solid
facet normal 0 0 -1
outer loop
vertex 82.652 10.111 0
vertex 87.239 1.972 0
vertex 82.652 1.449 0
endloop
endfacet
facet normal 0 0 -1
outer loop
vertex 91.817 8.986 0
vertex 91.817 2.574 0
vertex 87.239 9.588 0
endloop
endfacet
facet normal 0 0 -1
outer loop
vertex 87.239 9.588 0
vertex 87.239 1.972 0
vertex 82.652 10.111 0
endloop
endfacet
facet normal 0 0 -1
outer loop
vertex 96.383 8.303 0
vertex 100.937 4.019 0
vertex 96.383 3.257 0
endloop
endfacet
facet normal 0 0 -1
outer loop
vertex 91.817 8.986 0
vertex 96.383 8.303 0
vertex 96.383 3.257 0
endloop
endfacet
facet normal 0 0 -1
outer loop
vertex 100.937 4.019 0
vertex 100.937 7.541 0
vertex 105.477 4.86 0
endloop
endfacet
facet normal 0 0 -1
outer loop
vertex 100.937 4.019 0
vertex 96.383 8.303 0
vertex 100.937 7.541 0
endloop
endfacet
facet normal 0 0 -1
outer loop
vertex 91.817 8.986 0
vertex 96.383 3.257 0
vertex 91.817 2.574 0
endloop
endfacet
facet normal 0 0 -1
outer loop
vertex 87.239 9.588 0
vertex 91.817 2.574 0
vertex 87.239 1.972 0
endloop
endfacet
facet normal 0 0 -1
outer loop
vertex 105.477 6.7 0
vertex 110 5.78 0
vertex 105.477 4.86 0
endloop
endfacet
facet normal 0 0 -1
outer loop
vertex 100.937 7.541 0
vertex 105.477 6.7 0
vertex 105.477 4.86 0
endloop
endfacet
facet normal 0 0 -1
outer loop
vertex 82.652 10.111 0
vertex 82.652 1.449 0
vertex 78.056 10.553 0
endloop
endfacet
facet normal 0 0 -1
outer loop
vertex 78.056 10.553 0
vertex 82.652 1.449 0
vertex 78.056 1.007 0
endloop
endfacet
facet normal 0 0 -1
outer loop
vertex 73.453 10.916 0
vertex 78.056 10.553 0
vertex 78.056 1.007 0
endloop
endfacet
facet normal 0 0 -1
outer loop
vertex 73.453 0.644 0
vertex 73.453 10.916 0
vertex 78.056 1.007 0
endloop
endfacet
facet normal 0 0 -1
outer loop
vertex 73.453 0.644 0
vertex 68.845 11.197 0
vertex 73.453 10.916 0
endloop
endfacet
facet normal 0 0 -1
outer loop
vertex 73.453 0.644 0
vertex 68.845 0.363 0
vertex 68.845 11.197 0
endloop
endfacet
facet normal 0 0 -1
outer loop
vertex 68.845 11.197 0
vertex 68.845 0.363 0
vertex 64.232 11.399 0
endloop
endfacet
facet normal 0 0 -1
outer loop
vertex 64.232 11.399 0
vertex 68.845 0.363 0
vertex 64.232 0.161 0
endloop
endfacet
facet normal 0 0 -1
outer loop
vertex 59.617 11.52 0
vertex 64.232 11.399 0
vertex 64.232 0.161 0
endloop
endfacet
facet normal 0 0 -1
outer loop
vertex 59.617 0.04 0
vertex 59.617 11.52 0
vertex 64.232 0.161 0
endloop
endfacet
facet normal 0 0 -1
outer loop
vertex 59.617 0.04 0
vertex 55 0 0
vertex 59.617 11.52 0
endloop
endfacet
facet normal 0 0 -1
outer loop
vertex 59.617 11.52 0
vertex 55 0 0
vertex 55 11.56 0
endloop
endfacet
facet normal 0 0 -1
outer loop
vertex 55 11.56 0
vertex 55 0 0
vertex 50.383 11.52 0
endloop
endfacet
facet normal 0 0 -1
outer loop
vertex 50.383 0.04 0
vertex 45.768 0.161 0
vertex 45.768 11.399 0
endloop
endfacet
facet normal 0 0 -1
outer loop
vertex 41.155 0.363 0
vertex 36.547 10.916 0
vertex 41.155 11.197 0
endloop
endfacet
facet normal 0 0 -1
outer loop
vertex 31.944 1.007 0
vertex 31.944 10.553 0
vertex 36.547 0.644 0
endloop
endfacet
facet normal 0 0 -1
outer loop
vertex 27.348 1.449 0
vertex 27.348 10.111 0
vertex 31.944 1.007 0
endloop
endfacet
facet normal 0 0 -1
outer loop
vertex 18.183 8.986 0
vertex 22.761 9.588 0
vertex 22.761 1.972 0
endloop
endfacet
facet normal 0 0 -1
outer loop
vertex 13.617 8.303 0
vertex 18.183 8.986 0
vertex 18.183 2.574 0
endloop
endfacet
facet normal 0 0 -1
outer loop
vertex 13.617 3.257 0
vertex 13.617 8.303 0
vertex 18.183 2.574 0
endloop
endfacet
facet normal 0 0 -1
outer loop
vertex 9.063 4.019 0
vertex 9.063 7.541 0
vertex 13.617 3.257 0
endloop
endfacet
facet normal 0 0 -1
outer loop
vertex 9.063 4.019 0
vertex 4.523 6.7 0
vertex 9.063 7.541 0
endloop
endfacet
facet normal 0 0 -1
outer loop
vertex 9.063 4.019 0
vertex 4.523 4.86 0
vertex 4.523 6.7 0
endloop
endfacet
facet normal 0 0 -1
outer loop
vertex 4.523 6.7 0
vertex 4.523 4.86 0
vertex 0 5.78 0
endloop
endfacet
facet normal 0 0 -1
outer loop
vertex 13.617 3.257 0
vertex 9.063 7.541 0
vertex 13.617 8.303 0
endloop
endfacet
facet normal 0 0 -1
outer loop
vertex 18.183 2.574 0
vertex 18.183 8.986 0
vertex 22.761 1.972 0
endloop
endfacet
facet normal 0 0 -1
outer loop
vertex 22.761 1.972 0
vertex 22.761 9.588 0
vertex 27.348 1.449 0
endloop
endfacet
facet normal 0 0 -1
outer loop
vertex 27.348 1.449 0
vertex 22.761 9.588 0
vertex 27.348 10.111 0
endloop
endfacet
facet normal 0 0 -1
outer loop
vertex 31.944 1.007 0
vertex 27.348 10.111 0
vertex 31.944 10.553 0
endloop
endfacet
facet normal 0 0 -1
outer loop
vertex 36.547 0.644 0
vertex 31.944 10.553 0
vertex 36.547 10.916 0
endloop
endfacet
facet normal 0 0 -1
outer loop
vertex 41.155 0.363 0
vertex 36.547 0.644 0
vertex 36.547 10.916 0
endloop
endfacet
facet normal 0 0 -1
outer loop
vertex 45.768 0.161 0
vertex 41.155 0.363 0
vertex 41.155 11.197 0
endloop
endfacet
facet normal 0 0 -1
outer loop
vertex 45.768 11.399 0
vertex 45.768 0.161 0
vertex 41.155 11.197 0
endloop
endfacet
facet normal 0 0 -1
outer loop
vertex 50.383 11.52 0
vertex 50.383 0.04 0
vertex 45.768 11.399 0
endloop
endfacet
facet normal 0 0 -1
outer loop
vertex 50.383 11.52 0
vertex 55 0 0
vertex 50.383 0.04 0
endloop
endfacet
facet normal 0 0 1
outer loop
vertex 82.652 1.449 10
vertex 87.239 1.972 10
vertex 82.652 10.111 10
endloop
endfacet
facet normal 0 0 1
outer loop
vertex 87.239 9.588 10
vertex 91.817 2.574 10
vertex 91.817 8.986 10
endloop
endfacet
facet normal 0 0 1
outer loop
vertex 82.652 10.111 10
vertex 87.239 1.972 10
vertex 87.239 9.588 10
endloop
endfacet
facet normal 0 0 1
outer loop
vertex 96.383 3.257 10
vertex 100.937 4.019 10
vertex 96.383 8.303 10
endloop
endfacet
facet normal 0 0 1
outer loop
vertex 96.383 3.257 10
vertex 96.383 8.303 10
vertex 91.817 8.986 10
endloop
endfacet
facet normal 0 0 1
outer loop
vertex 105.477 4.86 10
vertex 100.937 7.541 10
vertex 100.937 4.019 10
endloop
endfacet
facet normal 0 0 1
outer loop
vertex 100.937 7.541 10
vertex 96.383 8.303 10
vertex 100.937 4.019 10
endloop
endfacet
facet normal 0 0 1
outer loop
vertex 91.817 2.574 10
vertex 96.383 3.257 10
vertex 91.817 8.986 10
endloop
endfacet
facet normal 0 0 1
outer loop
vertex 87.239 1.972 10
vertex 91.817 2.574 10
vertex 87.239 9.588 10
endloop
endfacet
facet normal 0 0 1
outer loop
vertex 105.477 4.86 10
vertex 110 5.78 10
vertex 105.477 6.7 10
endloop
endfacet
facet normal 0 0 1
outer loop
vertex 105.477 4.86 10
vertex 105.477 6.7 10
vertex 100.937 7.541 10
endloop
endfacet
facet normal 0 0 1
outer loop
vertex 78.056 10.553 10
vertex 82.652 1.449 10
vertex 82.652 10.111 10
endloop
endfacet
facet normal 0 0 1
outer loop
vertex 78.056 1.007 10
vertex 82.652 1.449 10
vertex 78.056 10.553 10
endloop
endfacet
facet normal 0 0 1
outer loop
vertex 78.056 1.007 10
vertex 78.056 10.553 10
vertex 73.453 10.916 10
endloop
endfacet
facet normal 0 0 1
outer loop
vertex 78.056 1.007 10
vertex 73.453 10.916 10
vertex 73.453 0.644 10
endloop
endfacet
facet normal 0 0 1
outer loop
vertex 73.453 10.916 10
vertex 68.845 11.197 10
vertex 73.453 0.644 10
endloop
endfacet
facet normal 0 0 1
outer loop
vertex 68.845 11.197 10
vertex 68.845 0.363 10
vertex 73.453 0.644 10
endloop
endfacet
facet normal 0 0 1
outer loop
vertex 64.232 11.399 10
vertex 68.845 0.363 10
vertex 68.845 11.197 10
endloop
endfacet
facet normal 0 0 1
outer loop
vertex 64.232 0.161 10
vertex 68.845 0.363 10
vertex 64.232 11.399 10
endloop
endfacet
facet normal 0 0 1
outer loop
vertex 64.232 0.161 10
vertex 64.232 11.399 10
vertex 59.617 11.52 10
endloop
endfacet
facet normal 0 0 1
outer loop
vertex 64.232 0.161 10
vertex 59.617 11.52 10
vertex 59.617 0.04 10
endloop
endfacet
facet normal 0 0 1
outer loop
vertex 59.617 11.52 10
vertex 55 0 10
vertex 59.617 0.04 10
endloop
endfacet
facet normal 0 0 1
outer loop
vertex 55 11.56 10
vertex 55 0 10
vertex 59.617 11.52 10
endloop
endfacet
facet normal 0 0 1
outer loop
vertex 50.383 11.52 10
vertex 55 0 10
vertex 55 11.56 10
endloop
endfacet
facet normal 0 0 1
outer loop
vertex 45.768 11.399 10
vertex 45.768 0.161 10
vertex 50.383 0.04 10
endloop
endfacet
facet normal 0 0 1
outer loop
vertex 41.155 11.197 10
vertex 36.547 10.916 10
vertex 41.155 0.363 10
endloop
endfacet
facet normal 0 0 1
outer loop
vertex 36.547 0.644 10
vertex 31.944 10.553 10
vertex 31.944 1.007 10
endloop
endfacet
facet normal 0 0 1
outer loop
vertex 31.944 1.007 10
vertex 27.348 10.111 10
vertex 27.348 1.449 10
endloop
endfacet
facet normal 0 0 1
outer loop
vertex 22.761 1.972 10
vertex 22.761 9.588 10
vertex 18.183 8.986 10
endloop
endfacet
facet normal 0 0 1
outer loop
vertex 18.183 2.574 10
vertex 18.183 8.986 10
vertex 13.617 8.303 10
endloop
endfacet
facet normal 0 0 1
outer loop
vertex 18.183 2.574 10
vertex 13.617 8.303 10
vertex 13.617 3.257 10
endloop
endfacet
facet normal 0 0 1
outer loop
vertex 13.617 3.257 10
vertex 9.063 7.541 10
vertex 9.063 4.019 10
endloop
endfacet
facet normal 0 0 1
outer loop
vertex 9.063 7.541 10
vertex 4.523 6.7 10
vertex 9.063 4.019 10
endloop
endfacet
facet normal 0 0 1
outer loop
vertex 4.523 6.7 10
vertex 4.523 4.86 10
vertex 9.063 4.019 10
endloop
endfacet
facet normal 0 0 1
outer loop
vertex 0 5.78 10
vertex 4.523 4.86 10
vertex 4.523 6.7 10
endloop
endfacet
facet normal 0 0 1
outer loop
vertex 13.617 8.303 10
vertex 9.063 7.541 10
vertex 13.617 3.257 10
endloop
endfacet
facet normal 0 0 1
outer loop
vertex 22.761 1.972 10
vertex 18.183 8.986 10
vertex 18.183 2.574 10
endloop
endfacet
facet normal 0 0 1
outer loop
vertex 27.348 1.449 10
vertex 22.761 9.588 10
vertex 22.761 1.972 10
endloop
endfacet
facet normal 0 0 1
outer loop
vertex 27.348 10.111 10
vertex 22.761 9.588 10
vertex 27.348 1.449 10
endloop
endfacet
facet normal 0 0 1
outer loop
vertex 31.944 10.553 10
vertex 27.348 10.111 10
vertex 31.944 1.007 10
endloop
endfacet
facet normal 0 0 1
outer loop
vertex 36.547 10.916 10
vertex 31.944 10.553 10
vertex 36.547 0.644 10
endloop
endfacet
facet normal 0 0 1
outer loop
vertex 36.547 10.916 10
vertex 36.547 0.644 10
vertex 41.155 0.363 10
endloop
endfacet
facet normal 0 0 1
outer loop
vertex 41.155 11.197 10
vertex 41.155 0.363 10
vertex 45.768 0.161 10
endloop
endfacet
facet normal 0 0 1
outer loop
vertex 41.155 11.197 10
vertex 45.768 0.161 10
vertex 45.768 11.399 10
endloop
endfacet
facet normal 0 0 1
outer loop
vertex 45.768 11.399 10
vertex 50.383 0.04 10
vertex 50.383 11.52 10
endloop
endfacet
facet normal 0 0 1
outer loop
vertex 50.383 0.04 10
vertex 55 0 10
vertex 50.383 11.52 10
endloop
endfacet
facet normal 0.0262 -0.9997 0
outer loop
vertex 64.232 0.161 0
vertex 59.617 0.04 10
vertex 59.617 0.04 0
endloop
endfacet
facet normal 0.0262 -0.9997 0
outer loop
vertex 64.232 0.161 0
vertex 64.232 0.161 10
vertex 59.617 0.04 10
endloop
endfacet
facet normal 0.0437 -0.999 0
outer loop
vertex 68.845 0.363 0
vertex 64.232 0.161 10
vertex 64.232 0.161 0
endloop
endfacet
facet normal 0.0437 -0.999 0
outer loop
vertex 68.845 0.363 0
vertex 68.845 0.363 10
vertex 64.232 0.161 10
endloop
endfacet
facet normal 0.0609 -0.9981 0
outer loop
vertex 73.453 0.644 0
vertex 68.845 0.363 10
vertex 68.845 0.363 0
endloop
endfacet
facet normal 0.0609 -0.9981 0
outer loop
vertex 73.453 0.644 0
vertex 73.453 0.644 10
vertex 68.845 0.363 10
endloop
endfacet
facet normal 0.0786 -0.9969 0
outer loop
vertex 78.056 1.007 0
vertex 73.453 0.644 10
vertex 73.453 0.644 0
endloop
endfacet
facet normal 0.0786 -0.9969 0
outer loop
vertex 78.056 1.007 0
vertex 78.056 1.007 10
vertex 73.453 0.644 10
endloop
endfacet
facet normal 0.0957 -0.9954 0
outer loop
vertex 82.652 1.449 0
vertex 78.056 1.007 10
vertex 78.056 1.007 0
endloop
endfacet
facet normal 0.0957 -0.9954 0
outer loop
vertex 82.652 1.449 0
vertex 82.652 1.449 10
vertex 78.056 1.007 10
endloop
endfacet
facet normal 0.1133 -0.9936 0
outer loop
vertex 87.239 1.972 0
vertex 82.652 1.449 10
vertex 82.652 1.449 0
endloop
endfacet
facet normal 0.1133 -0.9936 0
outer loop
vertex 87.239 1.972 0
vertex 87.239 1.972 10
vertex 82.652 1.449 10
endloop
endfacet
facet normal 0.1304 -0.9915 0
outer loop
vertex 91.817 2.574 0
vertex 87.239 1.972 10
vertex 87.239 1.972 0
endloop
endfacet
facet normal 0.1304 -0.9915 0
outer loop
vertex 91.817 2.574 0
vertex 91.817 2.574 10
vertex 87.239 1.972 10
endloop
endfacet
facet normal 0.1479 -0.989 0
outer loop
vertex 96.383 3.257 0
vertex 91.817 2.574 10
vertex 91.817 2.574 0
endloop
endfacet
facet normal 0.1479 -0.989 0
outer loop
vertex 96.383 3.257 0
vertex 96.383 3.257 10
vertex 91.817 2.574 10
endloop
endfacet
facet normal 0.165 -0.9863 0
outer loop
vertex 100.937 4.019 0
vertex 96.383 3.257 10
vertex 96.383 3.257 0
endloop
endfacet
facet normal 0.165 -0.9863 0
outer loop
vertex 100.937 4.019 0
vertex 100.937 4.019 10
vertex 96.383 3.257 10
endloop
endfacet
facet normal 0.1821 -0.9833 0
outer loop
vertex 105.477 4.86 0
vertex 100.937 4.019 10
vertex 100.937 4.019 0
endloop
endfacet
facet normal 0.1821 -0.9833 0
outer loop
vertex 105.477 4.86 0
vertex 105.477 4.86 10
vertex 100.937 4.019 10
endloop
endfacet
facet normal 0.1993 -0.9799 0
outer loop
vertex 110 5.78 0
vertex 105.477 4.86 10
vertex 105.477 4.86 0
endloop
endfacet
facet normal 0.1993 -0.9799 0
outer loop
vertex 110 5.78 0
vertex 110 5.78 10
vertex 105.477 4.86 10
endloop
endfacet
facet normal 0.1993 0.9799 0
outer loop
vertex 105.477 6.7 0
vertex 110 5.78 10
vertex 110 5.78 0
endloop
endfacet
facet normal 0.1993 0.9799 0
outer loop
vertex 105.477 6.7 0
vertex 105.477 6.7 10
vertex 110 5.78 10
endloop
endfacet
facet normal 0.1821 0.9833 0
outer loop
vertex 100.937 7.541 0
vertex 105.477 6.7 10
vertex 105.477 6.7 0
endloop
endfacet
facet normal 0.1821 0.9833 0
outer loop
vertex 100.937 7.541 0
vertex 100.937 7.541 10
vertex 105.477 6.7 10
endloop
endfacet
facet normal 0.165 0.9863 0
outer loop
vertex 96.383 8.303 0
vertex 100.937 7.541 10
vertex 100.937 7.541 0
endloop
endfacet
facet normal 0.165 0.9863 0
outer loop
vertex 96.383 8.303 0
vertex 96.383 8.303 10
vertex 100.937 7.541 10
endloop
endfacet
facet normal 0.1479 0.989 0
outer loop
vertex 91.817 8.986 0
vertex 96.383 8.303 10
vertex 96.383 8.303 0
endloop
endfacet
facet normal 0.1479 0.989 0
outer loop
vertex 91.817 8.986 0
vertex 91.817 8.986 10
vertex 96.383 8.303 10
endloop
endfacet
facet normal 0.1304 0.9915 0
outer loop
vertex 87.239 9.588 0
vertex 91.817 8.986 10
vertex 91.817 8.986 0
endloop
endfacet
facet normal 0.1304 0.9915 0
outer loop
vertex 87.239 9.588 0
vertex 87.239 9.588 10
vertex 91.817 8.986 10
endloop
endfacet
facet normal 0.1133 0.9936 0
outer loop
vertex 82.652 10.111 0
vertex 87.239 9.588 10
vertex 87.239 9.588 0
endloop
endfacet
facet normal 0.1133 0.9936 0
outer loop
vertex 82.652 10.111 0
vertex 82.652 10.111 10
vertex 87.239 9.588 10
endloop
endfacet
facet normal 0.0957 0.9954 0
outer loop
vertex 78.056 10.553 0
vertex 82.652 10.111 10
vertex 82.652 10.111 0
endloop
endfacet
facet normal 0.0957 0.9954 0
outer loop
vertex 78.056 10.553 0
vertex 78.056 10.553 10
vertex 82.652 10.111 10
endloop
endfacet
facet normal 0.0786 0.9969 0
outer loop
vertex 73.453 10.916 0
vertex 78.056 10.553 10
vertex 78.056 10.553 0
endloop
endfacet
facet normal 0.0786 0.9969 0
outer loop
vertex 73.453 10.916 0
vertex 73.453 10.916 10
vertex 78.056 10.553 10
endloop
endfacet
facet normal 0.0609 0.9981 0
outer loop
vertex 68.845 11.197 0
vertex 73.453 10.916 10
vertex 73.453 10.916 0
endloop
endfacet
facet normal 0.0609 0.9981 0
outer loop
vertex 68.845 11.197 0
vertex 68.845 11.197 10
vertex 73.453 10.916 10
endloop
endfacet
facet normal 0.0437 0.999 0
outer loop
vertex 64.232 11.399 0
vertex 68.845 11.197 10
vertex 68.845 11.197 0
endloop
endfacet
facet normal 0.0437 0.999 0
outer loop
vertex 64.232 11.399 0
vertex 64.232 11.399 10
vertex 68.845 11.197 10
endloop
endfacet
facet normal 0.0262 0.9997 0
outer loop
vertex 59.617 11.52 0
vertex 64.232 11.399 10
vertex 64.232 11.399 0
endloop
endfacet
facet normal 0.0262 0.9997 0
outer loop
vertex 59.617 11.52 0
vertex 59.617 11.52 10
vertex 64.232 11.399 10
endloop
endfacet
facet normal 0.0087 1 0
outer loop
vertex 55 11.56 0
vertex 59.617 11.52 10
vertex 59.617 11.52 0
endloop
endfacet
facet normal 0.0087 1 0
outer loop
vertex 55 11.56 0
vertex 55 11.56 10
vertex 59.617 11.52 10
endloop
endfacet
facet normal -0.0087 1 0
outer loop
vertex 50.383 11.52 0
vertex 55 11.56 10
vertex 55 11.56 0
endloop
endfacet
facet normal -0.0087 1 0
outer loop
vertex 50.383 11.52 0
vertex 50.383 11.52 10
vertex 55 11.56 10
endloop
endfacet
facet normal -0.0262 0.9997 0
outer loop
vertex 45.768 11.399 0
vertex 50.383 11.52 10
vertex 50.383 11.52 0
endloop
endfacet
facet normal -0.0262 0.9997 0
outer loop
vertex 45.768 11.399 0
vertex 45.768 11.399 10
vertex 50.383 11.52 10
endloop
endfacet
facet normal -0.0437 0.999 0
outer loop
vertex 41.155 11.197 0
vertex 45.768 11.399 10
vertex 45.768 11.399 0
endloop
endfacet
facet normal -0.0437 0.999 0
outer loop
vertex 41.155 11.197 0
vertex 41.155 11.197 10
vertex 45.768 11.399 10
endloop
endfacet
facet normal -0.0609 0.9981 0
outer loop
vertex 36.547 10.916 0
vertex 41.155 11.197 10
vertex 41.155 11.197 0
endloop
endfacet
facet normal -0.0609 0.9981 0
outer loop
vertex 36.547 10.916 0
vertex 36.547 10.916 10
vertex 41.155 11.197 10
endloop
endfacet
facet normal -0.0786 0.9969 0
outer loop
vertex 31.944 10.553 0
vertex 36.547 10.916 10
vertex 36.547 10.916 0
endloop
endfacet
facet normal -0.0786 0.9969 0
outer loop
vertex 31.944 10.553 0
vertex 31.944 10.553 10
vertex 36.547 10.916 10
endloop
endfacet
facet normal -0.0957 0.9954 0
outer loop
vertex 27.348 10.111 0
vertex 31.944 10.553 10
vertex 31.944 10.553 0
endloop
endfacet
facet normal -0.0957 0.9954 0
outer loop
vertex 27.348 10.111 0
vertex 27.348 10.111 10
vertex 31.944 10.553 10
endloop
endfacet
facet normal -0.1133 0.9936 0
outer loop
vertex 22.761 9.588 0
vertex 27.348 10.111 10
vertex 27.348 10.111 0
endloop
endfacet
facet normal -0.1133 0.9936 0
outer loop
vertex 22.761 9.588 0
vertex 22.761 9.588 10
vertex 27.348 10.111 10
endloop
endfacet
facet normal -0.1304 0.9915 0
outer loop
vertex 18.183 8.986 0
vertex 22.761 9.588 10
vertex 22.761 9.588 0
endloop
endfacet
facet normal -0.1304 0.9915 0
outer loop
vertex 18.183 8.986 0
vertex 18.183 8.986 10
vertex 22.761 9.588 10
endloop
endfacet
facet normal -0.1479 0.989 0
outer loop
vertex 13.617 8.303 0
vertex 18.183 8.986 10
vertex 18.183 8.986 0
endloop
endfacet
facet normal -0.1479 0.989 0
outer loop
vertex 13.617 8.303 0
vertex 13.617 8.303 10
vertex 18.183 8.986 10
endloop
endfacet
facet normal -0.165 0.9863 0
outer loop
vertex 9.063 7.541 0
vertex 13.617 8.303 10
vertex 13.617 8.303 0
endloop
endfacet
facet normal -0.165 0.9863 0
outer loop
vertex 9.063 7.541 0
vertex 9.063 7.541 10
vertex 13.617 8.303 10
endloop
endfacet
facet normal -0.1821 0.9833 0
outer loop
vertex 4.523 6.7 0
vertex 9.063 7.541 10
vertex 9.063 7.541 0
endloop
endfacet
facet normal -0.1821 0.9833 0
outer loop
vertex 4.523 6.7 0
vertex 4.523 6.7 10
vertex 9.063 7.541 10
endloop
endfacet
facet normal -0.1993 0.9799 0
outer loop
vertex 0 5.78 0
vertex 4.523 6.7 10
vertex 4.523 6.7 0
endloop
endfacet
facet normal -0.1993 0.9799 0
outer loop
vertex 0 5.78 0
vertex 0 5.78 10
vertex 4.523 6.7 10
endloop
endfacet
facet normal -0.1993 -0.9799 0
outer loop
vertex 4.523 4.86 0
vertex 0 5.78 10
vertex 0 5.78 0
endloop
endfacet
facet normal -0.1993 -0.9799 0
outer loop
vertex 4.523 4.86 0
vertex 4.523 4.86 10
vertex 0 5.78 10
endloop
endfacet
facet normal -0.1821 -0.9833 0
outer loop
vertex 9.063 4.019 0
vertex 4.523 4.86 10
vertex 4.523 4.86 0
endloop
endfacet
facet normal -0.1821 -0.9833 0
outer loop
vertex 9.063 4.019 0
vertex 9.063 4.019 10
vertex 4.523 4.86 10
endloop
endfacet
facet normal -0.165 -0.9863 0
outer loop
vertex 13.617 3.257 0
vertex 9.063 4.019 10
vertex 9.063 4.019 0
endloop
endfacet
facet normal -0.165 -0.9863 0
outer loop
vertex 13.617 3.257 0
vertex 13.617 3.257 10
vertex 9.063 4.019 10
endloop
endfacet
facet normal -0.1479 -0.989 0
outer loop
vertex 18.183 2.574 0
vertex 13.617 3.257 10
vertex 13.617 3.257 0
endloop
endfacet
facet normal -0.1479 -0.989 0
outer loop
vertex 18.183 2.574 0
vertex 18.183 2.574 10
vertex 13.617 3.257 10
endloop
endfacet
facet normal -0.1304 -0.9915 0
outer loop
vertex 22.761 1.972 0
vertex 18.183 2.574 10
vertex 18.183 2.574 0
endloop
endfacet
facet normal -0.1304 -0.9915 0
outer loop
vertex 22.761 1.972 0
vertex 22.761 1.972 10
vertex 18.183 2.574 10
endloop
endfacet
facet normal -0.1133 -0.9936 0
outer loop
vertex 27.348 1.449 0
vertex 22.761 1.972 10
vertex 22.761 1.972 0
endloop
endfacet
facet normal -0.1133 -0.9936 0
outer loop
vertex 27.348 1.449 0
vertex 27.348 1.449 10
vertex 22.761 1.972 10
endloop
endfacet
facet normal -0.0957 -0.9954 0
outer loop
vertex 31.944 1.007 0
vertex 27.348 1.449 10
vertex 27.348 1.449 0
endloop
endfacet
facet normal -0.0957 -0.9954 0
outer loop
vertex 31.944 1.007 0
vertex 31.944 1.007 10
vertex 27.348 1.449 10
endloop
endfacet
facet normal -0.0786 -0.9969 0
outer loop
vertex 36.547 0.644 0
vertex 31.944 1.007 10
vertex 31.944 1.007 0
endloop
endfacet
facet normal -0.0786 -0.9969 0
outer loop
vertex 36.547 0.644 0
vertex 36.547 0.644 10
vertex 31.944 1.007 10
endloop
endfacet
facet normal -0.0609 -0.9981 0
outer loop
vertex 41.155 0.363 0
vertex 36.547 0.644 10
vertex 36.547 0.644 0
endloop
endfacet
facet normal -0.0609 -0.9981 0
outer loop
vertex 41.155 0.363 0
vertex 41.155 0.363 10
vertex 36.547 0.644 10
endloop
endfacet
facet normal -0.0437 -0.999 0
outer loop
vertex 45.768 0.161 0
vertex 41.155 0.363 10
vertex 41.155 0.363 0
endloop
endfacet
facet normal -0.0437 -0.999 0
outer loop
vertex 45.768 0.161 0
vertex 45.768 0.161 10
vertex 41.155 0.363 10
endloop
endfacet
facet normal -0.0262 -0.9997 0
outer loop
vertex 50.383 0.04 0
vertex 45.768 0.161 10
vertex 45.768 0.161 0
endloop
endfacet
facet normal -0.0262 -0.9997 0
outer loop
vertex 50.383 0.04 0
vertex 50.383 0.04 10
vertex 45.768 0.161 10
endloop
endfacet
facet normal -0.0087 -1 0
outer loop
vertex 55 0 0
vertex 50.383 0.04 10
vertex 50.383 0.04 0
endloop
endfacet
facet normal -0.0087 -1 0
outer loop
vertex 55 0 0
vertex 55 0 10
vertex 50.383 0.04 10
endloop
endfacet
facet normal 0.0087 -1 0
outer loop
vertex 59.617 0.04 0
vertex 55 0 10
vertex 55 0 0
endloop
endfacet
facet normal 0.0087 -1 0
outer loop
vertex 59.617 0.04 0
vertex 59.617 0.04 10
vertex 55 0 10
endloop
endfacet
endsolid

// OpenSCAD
$fn = 32;

// ----------------------------------------------------------------------
// Arc profile plate: lens, 48 points
// ----------------------------------------------------------------------

// --- parameters (mm) ---
lens_chord = 110;         // chord length of the lens, X
arc_r = 264.54;           // radius of both arcs
arc_angle = 24;           // angle of each arc, degrees
sagitta = 5.78;           // bulge of each arc (half the lens height)
arc_step = 1;             // sampling step of the arcs, degrees
plate_t = 10;             // plate thickness, Z

bbox_y = 2 * sagitta;  // full lens height

profile = [[110, 5.78], [105.477, 6.7], [100.937, 7.541], [96.383, 8.303], [91.817, 8.986], [87.239, 9.588], [82.652, 10.111], [78.056, 10.553], [73.453, 10.916], [68.845, 11.197], [64.232, 11.399], [59.617, 11.52], [55, 11.56], [50.383, 11.52], [45.768, 11.399], [41.155, 11.197], [36.547, 10.916], [31.944, 10.553], [27.348, 10.111], [22.761, 9.588], [18.183, 8.986], [13.617, 8.303], [9.063, 7.541], [4.523, 6.7], [0, 5.78], [4.523, 4.86], [9.063, 4.019], [13.617, 3.257], [18.183, 2.574], [22.761, 1.972], [27.348, 1.449], [31.944, 1.007], [36.547, 0.644], [41.155, 0.363], [45.768, 0.161], [50.383, 0.04], [55, 0], [59.617, 0.04], [64.232, 0.161], [68.845, 0.363], [73.453, 0.644], [78.056, 1.007], [82.652, 1.449], [87.239, 1.972], [91.817, 2.574], [96.383, 3.257], [100.937, 4.019], [105.477, 4.86]];  // primary outline, 48 points, counter clockwise

// --- the one profile operation ---
linear_extrude(height = plate_t) polygon(points = profile);
